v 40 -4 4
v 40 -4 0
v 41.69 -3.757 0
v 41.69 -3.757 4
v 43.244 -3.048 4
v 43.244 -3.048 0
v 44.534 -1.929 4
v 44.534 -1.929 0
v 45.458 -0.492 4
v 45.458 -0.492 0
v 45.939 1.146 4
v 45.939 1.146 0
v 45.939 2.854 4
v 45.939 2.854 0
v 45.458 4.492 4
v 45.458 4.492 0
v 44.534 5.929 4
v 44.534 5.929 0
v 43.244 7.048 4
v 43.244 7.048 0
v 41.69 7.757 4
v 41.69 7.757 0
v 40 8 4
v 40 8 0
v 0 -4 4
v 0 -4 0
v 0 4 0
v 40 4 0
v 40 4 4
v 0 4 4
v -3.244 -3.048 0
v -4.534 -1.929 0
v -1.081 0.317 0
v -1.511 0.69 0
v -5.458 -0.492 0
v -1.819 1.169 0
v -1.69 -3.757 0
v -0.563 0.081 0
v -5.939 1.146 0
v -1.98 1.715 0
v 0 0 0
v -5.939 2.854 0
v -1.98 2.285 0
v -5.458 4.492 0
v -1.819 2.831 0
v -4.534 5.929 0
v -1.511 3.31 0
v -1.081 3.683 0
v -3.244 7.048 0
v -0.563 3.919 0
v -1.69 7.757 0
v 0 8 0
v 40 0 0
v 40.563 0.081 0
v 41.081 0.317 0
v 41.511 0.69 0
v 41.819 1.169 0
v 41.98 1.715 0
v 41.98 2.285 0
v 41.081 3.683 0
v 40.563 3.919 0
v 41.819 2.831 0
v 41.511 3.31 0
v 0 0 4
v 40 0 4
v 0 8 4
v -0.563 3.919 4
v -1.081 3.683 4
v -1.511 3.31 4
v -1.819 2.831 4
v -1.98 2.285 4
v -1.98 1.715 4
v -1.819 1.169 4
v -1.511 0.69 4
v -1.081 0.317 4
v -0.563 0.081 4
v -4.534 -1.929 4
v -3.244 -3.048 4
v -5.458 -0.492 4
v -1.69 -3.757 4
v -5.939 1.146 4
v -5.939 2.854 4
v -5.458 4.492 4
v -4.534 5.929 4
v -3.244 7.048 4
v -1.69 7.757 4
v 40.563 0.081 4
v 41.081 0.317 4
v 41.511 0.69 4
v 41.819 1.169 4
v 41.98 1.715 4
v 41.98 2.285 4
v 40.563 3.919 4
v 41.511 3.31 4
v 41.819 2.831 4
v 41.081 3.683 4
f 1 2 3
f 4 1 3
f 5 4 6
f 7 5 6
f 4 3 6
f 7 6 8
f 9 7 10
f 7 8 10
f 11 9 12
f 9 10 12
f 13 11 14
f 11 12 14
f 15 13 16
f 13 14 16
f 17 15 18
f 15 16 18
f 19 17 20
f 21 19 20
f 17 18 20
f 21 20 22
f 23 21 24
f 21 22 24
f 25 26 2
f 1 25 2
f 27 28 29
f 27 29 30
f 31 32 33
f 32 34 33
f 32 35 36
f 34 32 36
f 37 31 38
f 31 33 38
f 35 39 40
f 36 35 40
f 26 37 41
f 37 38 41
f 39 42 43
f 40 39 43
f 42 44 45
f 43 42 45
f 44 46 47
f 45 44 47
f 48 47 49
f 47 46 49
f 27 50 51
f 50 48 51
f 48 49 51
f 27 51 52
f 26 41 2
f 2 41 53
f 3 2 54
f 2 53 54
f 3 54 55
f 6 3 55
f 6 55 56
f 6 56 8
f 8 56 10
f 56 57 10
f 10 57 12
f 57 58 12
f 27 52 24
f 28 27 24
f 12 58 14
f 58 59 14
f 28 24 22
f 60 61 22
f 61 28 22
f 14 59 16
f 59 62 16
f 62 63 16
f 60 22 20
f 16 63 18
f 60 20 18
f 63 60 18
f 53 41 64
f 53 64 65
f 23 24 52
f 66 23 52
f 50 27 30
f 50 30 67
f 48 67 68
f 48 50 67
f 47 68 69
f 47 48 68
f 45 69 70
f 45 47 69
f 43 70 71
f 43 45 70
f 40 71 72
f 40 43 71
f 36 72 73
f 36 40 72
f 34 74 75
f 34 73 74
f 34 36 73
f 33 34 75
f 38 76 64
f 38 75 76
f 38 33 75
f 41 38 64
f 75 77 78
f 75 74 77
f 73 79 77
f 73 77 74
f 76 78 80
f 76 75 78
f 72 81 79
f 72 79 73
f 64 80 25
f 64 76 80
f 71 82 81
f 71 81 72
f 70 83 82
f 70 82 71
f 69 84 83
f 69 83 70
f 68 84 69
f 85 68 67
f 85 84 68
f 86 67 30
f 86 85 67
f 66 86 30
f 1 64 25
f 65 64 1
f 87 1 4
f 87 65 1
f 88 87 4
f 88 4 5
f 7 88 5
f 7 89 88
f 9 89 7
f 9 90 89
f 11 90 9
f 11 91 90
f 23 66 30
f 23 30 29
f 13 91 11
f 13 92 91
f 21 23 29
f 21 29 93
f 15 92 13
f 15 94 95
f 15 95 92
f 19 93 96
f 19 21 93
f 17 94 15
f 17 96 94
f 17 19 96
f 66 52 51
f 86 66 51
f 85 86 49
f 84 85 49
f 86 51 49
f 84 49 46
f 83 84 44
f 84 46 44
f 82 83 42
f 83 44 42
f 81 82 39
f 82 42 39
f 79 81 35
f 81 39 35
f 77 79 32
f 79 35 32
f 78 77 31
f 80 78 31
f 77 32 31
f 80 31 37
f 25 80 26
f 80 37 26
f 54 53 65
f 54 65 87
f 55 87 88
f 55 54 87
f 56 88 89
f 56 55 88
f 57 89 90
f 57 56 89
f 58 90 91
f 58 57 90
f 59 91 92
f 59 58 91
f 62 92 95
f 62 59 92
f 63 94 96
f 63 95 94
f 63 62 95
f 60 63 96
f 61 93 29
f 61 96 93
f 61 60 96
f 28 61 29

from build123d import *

# Parameters (mm, degrees)
F2_DEPTH = 4
F3_DEPTH = 25


with BuildPart() as f2:
    # F0 (on Top) → F2 (new body)
    with BuildSketch(Plane.XY):
        with BuildLine():
            Line((40, 8), (0, 8))
            ThreePointArc((0, 8), (-6, 2), (0, -4))
            Line((0, -4), (40, -4))
            ThreePointArc((40, -4), (46, 2), (40, 8))
        make_face()
    extrude(amount=F2_DEPTH)

    # F1 (on Top) → F3 (cut)
    with BuildSketch(Plane.XY):
        with BuildLine():
            ThreePointArc((0, 4), (-2, 2), (0, 0))
            Line((0, 0), (40, 0))
            ThreePointArc((40, 0), (42, 2), (40, 4))
            Line((40, 4), (0, 4))
        make_face()
    extrude(amount=F3_DEPTH, mode=Mode.SUBTRACT)


solid = f2.part
